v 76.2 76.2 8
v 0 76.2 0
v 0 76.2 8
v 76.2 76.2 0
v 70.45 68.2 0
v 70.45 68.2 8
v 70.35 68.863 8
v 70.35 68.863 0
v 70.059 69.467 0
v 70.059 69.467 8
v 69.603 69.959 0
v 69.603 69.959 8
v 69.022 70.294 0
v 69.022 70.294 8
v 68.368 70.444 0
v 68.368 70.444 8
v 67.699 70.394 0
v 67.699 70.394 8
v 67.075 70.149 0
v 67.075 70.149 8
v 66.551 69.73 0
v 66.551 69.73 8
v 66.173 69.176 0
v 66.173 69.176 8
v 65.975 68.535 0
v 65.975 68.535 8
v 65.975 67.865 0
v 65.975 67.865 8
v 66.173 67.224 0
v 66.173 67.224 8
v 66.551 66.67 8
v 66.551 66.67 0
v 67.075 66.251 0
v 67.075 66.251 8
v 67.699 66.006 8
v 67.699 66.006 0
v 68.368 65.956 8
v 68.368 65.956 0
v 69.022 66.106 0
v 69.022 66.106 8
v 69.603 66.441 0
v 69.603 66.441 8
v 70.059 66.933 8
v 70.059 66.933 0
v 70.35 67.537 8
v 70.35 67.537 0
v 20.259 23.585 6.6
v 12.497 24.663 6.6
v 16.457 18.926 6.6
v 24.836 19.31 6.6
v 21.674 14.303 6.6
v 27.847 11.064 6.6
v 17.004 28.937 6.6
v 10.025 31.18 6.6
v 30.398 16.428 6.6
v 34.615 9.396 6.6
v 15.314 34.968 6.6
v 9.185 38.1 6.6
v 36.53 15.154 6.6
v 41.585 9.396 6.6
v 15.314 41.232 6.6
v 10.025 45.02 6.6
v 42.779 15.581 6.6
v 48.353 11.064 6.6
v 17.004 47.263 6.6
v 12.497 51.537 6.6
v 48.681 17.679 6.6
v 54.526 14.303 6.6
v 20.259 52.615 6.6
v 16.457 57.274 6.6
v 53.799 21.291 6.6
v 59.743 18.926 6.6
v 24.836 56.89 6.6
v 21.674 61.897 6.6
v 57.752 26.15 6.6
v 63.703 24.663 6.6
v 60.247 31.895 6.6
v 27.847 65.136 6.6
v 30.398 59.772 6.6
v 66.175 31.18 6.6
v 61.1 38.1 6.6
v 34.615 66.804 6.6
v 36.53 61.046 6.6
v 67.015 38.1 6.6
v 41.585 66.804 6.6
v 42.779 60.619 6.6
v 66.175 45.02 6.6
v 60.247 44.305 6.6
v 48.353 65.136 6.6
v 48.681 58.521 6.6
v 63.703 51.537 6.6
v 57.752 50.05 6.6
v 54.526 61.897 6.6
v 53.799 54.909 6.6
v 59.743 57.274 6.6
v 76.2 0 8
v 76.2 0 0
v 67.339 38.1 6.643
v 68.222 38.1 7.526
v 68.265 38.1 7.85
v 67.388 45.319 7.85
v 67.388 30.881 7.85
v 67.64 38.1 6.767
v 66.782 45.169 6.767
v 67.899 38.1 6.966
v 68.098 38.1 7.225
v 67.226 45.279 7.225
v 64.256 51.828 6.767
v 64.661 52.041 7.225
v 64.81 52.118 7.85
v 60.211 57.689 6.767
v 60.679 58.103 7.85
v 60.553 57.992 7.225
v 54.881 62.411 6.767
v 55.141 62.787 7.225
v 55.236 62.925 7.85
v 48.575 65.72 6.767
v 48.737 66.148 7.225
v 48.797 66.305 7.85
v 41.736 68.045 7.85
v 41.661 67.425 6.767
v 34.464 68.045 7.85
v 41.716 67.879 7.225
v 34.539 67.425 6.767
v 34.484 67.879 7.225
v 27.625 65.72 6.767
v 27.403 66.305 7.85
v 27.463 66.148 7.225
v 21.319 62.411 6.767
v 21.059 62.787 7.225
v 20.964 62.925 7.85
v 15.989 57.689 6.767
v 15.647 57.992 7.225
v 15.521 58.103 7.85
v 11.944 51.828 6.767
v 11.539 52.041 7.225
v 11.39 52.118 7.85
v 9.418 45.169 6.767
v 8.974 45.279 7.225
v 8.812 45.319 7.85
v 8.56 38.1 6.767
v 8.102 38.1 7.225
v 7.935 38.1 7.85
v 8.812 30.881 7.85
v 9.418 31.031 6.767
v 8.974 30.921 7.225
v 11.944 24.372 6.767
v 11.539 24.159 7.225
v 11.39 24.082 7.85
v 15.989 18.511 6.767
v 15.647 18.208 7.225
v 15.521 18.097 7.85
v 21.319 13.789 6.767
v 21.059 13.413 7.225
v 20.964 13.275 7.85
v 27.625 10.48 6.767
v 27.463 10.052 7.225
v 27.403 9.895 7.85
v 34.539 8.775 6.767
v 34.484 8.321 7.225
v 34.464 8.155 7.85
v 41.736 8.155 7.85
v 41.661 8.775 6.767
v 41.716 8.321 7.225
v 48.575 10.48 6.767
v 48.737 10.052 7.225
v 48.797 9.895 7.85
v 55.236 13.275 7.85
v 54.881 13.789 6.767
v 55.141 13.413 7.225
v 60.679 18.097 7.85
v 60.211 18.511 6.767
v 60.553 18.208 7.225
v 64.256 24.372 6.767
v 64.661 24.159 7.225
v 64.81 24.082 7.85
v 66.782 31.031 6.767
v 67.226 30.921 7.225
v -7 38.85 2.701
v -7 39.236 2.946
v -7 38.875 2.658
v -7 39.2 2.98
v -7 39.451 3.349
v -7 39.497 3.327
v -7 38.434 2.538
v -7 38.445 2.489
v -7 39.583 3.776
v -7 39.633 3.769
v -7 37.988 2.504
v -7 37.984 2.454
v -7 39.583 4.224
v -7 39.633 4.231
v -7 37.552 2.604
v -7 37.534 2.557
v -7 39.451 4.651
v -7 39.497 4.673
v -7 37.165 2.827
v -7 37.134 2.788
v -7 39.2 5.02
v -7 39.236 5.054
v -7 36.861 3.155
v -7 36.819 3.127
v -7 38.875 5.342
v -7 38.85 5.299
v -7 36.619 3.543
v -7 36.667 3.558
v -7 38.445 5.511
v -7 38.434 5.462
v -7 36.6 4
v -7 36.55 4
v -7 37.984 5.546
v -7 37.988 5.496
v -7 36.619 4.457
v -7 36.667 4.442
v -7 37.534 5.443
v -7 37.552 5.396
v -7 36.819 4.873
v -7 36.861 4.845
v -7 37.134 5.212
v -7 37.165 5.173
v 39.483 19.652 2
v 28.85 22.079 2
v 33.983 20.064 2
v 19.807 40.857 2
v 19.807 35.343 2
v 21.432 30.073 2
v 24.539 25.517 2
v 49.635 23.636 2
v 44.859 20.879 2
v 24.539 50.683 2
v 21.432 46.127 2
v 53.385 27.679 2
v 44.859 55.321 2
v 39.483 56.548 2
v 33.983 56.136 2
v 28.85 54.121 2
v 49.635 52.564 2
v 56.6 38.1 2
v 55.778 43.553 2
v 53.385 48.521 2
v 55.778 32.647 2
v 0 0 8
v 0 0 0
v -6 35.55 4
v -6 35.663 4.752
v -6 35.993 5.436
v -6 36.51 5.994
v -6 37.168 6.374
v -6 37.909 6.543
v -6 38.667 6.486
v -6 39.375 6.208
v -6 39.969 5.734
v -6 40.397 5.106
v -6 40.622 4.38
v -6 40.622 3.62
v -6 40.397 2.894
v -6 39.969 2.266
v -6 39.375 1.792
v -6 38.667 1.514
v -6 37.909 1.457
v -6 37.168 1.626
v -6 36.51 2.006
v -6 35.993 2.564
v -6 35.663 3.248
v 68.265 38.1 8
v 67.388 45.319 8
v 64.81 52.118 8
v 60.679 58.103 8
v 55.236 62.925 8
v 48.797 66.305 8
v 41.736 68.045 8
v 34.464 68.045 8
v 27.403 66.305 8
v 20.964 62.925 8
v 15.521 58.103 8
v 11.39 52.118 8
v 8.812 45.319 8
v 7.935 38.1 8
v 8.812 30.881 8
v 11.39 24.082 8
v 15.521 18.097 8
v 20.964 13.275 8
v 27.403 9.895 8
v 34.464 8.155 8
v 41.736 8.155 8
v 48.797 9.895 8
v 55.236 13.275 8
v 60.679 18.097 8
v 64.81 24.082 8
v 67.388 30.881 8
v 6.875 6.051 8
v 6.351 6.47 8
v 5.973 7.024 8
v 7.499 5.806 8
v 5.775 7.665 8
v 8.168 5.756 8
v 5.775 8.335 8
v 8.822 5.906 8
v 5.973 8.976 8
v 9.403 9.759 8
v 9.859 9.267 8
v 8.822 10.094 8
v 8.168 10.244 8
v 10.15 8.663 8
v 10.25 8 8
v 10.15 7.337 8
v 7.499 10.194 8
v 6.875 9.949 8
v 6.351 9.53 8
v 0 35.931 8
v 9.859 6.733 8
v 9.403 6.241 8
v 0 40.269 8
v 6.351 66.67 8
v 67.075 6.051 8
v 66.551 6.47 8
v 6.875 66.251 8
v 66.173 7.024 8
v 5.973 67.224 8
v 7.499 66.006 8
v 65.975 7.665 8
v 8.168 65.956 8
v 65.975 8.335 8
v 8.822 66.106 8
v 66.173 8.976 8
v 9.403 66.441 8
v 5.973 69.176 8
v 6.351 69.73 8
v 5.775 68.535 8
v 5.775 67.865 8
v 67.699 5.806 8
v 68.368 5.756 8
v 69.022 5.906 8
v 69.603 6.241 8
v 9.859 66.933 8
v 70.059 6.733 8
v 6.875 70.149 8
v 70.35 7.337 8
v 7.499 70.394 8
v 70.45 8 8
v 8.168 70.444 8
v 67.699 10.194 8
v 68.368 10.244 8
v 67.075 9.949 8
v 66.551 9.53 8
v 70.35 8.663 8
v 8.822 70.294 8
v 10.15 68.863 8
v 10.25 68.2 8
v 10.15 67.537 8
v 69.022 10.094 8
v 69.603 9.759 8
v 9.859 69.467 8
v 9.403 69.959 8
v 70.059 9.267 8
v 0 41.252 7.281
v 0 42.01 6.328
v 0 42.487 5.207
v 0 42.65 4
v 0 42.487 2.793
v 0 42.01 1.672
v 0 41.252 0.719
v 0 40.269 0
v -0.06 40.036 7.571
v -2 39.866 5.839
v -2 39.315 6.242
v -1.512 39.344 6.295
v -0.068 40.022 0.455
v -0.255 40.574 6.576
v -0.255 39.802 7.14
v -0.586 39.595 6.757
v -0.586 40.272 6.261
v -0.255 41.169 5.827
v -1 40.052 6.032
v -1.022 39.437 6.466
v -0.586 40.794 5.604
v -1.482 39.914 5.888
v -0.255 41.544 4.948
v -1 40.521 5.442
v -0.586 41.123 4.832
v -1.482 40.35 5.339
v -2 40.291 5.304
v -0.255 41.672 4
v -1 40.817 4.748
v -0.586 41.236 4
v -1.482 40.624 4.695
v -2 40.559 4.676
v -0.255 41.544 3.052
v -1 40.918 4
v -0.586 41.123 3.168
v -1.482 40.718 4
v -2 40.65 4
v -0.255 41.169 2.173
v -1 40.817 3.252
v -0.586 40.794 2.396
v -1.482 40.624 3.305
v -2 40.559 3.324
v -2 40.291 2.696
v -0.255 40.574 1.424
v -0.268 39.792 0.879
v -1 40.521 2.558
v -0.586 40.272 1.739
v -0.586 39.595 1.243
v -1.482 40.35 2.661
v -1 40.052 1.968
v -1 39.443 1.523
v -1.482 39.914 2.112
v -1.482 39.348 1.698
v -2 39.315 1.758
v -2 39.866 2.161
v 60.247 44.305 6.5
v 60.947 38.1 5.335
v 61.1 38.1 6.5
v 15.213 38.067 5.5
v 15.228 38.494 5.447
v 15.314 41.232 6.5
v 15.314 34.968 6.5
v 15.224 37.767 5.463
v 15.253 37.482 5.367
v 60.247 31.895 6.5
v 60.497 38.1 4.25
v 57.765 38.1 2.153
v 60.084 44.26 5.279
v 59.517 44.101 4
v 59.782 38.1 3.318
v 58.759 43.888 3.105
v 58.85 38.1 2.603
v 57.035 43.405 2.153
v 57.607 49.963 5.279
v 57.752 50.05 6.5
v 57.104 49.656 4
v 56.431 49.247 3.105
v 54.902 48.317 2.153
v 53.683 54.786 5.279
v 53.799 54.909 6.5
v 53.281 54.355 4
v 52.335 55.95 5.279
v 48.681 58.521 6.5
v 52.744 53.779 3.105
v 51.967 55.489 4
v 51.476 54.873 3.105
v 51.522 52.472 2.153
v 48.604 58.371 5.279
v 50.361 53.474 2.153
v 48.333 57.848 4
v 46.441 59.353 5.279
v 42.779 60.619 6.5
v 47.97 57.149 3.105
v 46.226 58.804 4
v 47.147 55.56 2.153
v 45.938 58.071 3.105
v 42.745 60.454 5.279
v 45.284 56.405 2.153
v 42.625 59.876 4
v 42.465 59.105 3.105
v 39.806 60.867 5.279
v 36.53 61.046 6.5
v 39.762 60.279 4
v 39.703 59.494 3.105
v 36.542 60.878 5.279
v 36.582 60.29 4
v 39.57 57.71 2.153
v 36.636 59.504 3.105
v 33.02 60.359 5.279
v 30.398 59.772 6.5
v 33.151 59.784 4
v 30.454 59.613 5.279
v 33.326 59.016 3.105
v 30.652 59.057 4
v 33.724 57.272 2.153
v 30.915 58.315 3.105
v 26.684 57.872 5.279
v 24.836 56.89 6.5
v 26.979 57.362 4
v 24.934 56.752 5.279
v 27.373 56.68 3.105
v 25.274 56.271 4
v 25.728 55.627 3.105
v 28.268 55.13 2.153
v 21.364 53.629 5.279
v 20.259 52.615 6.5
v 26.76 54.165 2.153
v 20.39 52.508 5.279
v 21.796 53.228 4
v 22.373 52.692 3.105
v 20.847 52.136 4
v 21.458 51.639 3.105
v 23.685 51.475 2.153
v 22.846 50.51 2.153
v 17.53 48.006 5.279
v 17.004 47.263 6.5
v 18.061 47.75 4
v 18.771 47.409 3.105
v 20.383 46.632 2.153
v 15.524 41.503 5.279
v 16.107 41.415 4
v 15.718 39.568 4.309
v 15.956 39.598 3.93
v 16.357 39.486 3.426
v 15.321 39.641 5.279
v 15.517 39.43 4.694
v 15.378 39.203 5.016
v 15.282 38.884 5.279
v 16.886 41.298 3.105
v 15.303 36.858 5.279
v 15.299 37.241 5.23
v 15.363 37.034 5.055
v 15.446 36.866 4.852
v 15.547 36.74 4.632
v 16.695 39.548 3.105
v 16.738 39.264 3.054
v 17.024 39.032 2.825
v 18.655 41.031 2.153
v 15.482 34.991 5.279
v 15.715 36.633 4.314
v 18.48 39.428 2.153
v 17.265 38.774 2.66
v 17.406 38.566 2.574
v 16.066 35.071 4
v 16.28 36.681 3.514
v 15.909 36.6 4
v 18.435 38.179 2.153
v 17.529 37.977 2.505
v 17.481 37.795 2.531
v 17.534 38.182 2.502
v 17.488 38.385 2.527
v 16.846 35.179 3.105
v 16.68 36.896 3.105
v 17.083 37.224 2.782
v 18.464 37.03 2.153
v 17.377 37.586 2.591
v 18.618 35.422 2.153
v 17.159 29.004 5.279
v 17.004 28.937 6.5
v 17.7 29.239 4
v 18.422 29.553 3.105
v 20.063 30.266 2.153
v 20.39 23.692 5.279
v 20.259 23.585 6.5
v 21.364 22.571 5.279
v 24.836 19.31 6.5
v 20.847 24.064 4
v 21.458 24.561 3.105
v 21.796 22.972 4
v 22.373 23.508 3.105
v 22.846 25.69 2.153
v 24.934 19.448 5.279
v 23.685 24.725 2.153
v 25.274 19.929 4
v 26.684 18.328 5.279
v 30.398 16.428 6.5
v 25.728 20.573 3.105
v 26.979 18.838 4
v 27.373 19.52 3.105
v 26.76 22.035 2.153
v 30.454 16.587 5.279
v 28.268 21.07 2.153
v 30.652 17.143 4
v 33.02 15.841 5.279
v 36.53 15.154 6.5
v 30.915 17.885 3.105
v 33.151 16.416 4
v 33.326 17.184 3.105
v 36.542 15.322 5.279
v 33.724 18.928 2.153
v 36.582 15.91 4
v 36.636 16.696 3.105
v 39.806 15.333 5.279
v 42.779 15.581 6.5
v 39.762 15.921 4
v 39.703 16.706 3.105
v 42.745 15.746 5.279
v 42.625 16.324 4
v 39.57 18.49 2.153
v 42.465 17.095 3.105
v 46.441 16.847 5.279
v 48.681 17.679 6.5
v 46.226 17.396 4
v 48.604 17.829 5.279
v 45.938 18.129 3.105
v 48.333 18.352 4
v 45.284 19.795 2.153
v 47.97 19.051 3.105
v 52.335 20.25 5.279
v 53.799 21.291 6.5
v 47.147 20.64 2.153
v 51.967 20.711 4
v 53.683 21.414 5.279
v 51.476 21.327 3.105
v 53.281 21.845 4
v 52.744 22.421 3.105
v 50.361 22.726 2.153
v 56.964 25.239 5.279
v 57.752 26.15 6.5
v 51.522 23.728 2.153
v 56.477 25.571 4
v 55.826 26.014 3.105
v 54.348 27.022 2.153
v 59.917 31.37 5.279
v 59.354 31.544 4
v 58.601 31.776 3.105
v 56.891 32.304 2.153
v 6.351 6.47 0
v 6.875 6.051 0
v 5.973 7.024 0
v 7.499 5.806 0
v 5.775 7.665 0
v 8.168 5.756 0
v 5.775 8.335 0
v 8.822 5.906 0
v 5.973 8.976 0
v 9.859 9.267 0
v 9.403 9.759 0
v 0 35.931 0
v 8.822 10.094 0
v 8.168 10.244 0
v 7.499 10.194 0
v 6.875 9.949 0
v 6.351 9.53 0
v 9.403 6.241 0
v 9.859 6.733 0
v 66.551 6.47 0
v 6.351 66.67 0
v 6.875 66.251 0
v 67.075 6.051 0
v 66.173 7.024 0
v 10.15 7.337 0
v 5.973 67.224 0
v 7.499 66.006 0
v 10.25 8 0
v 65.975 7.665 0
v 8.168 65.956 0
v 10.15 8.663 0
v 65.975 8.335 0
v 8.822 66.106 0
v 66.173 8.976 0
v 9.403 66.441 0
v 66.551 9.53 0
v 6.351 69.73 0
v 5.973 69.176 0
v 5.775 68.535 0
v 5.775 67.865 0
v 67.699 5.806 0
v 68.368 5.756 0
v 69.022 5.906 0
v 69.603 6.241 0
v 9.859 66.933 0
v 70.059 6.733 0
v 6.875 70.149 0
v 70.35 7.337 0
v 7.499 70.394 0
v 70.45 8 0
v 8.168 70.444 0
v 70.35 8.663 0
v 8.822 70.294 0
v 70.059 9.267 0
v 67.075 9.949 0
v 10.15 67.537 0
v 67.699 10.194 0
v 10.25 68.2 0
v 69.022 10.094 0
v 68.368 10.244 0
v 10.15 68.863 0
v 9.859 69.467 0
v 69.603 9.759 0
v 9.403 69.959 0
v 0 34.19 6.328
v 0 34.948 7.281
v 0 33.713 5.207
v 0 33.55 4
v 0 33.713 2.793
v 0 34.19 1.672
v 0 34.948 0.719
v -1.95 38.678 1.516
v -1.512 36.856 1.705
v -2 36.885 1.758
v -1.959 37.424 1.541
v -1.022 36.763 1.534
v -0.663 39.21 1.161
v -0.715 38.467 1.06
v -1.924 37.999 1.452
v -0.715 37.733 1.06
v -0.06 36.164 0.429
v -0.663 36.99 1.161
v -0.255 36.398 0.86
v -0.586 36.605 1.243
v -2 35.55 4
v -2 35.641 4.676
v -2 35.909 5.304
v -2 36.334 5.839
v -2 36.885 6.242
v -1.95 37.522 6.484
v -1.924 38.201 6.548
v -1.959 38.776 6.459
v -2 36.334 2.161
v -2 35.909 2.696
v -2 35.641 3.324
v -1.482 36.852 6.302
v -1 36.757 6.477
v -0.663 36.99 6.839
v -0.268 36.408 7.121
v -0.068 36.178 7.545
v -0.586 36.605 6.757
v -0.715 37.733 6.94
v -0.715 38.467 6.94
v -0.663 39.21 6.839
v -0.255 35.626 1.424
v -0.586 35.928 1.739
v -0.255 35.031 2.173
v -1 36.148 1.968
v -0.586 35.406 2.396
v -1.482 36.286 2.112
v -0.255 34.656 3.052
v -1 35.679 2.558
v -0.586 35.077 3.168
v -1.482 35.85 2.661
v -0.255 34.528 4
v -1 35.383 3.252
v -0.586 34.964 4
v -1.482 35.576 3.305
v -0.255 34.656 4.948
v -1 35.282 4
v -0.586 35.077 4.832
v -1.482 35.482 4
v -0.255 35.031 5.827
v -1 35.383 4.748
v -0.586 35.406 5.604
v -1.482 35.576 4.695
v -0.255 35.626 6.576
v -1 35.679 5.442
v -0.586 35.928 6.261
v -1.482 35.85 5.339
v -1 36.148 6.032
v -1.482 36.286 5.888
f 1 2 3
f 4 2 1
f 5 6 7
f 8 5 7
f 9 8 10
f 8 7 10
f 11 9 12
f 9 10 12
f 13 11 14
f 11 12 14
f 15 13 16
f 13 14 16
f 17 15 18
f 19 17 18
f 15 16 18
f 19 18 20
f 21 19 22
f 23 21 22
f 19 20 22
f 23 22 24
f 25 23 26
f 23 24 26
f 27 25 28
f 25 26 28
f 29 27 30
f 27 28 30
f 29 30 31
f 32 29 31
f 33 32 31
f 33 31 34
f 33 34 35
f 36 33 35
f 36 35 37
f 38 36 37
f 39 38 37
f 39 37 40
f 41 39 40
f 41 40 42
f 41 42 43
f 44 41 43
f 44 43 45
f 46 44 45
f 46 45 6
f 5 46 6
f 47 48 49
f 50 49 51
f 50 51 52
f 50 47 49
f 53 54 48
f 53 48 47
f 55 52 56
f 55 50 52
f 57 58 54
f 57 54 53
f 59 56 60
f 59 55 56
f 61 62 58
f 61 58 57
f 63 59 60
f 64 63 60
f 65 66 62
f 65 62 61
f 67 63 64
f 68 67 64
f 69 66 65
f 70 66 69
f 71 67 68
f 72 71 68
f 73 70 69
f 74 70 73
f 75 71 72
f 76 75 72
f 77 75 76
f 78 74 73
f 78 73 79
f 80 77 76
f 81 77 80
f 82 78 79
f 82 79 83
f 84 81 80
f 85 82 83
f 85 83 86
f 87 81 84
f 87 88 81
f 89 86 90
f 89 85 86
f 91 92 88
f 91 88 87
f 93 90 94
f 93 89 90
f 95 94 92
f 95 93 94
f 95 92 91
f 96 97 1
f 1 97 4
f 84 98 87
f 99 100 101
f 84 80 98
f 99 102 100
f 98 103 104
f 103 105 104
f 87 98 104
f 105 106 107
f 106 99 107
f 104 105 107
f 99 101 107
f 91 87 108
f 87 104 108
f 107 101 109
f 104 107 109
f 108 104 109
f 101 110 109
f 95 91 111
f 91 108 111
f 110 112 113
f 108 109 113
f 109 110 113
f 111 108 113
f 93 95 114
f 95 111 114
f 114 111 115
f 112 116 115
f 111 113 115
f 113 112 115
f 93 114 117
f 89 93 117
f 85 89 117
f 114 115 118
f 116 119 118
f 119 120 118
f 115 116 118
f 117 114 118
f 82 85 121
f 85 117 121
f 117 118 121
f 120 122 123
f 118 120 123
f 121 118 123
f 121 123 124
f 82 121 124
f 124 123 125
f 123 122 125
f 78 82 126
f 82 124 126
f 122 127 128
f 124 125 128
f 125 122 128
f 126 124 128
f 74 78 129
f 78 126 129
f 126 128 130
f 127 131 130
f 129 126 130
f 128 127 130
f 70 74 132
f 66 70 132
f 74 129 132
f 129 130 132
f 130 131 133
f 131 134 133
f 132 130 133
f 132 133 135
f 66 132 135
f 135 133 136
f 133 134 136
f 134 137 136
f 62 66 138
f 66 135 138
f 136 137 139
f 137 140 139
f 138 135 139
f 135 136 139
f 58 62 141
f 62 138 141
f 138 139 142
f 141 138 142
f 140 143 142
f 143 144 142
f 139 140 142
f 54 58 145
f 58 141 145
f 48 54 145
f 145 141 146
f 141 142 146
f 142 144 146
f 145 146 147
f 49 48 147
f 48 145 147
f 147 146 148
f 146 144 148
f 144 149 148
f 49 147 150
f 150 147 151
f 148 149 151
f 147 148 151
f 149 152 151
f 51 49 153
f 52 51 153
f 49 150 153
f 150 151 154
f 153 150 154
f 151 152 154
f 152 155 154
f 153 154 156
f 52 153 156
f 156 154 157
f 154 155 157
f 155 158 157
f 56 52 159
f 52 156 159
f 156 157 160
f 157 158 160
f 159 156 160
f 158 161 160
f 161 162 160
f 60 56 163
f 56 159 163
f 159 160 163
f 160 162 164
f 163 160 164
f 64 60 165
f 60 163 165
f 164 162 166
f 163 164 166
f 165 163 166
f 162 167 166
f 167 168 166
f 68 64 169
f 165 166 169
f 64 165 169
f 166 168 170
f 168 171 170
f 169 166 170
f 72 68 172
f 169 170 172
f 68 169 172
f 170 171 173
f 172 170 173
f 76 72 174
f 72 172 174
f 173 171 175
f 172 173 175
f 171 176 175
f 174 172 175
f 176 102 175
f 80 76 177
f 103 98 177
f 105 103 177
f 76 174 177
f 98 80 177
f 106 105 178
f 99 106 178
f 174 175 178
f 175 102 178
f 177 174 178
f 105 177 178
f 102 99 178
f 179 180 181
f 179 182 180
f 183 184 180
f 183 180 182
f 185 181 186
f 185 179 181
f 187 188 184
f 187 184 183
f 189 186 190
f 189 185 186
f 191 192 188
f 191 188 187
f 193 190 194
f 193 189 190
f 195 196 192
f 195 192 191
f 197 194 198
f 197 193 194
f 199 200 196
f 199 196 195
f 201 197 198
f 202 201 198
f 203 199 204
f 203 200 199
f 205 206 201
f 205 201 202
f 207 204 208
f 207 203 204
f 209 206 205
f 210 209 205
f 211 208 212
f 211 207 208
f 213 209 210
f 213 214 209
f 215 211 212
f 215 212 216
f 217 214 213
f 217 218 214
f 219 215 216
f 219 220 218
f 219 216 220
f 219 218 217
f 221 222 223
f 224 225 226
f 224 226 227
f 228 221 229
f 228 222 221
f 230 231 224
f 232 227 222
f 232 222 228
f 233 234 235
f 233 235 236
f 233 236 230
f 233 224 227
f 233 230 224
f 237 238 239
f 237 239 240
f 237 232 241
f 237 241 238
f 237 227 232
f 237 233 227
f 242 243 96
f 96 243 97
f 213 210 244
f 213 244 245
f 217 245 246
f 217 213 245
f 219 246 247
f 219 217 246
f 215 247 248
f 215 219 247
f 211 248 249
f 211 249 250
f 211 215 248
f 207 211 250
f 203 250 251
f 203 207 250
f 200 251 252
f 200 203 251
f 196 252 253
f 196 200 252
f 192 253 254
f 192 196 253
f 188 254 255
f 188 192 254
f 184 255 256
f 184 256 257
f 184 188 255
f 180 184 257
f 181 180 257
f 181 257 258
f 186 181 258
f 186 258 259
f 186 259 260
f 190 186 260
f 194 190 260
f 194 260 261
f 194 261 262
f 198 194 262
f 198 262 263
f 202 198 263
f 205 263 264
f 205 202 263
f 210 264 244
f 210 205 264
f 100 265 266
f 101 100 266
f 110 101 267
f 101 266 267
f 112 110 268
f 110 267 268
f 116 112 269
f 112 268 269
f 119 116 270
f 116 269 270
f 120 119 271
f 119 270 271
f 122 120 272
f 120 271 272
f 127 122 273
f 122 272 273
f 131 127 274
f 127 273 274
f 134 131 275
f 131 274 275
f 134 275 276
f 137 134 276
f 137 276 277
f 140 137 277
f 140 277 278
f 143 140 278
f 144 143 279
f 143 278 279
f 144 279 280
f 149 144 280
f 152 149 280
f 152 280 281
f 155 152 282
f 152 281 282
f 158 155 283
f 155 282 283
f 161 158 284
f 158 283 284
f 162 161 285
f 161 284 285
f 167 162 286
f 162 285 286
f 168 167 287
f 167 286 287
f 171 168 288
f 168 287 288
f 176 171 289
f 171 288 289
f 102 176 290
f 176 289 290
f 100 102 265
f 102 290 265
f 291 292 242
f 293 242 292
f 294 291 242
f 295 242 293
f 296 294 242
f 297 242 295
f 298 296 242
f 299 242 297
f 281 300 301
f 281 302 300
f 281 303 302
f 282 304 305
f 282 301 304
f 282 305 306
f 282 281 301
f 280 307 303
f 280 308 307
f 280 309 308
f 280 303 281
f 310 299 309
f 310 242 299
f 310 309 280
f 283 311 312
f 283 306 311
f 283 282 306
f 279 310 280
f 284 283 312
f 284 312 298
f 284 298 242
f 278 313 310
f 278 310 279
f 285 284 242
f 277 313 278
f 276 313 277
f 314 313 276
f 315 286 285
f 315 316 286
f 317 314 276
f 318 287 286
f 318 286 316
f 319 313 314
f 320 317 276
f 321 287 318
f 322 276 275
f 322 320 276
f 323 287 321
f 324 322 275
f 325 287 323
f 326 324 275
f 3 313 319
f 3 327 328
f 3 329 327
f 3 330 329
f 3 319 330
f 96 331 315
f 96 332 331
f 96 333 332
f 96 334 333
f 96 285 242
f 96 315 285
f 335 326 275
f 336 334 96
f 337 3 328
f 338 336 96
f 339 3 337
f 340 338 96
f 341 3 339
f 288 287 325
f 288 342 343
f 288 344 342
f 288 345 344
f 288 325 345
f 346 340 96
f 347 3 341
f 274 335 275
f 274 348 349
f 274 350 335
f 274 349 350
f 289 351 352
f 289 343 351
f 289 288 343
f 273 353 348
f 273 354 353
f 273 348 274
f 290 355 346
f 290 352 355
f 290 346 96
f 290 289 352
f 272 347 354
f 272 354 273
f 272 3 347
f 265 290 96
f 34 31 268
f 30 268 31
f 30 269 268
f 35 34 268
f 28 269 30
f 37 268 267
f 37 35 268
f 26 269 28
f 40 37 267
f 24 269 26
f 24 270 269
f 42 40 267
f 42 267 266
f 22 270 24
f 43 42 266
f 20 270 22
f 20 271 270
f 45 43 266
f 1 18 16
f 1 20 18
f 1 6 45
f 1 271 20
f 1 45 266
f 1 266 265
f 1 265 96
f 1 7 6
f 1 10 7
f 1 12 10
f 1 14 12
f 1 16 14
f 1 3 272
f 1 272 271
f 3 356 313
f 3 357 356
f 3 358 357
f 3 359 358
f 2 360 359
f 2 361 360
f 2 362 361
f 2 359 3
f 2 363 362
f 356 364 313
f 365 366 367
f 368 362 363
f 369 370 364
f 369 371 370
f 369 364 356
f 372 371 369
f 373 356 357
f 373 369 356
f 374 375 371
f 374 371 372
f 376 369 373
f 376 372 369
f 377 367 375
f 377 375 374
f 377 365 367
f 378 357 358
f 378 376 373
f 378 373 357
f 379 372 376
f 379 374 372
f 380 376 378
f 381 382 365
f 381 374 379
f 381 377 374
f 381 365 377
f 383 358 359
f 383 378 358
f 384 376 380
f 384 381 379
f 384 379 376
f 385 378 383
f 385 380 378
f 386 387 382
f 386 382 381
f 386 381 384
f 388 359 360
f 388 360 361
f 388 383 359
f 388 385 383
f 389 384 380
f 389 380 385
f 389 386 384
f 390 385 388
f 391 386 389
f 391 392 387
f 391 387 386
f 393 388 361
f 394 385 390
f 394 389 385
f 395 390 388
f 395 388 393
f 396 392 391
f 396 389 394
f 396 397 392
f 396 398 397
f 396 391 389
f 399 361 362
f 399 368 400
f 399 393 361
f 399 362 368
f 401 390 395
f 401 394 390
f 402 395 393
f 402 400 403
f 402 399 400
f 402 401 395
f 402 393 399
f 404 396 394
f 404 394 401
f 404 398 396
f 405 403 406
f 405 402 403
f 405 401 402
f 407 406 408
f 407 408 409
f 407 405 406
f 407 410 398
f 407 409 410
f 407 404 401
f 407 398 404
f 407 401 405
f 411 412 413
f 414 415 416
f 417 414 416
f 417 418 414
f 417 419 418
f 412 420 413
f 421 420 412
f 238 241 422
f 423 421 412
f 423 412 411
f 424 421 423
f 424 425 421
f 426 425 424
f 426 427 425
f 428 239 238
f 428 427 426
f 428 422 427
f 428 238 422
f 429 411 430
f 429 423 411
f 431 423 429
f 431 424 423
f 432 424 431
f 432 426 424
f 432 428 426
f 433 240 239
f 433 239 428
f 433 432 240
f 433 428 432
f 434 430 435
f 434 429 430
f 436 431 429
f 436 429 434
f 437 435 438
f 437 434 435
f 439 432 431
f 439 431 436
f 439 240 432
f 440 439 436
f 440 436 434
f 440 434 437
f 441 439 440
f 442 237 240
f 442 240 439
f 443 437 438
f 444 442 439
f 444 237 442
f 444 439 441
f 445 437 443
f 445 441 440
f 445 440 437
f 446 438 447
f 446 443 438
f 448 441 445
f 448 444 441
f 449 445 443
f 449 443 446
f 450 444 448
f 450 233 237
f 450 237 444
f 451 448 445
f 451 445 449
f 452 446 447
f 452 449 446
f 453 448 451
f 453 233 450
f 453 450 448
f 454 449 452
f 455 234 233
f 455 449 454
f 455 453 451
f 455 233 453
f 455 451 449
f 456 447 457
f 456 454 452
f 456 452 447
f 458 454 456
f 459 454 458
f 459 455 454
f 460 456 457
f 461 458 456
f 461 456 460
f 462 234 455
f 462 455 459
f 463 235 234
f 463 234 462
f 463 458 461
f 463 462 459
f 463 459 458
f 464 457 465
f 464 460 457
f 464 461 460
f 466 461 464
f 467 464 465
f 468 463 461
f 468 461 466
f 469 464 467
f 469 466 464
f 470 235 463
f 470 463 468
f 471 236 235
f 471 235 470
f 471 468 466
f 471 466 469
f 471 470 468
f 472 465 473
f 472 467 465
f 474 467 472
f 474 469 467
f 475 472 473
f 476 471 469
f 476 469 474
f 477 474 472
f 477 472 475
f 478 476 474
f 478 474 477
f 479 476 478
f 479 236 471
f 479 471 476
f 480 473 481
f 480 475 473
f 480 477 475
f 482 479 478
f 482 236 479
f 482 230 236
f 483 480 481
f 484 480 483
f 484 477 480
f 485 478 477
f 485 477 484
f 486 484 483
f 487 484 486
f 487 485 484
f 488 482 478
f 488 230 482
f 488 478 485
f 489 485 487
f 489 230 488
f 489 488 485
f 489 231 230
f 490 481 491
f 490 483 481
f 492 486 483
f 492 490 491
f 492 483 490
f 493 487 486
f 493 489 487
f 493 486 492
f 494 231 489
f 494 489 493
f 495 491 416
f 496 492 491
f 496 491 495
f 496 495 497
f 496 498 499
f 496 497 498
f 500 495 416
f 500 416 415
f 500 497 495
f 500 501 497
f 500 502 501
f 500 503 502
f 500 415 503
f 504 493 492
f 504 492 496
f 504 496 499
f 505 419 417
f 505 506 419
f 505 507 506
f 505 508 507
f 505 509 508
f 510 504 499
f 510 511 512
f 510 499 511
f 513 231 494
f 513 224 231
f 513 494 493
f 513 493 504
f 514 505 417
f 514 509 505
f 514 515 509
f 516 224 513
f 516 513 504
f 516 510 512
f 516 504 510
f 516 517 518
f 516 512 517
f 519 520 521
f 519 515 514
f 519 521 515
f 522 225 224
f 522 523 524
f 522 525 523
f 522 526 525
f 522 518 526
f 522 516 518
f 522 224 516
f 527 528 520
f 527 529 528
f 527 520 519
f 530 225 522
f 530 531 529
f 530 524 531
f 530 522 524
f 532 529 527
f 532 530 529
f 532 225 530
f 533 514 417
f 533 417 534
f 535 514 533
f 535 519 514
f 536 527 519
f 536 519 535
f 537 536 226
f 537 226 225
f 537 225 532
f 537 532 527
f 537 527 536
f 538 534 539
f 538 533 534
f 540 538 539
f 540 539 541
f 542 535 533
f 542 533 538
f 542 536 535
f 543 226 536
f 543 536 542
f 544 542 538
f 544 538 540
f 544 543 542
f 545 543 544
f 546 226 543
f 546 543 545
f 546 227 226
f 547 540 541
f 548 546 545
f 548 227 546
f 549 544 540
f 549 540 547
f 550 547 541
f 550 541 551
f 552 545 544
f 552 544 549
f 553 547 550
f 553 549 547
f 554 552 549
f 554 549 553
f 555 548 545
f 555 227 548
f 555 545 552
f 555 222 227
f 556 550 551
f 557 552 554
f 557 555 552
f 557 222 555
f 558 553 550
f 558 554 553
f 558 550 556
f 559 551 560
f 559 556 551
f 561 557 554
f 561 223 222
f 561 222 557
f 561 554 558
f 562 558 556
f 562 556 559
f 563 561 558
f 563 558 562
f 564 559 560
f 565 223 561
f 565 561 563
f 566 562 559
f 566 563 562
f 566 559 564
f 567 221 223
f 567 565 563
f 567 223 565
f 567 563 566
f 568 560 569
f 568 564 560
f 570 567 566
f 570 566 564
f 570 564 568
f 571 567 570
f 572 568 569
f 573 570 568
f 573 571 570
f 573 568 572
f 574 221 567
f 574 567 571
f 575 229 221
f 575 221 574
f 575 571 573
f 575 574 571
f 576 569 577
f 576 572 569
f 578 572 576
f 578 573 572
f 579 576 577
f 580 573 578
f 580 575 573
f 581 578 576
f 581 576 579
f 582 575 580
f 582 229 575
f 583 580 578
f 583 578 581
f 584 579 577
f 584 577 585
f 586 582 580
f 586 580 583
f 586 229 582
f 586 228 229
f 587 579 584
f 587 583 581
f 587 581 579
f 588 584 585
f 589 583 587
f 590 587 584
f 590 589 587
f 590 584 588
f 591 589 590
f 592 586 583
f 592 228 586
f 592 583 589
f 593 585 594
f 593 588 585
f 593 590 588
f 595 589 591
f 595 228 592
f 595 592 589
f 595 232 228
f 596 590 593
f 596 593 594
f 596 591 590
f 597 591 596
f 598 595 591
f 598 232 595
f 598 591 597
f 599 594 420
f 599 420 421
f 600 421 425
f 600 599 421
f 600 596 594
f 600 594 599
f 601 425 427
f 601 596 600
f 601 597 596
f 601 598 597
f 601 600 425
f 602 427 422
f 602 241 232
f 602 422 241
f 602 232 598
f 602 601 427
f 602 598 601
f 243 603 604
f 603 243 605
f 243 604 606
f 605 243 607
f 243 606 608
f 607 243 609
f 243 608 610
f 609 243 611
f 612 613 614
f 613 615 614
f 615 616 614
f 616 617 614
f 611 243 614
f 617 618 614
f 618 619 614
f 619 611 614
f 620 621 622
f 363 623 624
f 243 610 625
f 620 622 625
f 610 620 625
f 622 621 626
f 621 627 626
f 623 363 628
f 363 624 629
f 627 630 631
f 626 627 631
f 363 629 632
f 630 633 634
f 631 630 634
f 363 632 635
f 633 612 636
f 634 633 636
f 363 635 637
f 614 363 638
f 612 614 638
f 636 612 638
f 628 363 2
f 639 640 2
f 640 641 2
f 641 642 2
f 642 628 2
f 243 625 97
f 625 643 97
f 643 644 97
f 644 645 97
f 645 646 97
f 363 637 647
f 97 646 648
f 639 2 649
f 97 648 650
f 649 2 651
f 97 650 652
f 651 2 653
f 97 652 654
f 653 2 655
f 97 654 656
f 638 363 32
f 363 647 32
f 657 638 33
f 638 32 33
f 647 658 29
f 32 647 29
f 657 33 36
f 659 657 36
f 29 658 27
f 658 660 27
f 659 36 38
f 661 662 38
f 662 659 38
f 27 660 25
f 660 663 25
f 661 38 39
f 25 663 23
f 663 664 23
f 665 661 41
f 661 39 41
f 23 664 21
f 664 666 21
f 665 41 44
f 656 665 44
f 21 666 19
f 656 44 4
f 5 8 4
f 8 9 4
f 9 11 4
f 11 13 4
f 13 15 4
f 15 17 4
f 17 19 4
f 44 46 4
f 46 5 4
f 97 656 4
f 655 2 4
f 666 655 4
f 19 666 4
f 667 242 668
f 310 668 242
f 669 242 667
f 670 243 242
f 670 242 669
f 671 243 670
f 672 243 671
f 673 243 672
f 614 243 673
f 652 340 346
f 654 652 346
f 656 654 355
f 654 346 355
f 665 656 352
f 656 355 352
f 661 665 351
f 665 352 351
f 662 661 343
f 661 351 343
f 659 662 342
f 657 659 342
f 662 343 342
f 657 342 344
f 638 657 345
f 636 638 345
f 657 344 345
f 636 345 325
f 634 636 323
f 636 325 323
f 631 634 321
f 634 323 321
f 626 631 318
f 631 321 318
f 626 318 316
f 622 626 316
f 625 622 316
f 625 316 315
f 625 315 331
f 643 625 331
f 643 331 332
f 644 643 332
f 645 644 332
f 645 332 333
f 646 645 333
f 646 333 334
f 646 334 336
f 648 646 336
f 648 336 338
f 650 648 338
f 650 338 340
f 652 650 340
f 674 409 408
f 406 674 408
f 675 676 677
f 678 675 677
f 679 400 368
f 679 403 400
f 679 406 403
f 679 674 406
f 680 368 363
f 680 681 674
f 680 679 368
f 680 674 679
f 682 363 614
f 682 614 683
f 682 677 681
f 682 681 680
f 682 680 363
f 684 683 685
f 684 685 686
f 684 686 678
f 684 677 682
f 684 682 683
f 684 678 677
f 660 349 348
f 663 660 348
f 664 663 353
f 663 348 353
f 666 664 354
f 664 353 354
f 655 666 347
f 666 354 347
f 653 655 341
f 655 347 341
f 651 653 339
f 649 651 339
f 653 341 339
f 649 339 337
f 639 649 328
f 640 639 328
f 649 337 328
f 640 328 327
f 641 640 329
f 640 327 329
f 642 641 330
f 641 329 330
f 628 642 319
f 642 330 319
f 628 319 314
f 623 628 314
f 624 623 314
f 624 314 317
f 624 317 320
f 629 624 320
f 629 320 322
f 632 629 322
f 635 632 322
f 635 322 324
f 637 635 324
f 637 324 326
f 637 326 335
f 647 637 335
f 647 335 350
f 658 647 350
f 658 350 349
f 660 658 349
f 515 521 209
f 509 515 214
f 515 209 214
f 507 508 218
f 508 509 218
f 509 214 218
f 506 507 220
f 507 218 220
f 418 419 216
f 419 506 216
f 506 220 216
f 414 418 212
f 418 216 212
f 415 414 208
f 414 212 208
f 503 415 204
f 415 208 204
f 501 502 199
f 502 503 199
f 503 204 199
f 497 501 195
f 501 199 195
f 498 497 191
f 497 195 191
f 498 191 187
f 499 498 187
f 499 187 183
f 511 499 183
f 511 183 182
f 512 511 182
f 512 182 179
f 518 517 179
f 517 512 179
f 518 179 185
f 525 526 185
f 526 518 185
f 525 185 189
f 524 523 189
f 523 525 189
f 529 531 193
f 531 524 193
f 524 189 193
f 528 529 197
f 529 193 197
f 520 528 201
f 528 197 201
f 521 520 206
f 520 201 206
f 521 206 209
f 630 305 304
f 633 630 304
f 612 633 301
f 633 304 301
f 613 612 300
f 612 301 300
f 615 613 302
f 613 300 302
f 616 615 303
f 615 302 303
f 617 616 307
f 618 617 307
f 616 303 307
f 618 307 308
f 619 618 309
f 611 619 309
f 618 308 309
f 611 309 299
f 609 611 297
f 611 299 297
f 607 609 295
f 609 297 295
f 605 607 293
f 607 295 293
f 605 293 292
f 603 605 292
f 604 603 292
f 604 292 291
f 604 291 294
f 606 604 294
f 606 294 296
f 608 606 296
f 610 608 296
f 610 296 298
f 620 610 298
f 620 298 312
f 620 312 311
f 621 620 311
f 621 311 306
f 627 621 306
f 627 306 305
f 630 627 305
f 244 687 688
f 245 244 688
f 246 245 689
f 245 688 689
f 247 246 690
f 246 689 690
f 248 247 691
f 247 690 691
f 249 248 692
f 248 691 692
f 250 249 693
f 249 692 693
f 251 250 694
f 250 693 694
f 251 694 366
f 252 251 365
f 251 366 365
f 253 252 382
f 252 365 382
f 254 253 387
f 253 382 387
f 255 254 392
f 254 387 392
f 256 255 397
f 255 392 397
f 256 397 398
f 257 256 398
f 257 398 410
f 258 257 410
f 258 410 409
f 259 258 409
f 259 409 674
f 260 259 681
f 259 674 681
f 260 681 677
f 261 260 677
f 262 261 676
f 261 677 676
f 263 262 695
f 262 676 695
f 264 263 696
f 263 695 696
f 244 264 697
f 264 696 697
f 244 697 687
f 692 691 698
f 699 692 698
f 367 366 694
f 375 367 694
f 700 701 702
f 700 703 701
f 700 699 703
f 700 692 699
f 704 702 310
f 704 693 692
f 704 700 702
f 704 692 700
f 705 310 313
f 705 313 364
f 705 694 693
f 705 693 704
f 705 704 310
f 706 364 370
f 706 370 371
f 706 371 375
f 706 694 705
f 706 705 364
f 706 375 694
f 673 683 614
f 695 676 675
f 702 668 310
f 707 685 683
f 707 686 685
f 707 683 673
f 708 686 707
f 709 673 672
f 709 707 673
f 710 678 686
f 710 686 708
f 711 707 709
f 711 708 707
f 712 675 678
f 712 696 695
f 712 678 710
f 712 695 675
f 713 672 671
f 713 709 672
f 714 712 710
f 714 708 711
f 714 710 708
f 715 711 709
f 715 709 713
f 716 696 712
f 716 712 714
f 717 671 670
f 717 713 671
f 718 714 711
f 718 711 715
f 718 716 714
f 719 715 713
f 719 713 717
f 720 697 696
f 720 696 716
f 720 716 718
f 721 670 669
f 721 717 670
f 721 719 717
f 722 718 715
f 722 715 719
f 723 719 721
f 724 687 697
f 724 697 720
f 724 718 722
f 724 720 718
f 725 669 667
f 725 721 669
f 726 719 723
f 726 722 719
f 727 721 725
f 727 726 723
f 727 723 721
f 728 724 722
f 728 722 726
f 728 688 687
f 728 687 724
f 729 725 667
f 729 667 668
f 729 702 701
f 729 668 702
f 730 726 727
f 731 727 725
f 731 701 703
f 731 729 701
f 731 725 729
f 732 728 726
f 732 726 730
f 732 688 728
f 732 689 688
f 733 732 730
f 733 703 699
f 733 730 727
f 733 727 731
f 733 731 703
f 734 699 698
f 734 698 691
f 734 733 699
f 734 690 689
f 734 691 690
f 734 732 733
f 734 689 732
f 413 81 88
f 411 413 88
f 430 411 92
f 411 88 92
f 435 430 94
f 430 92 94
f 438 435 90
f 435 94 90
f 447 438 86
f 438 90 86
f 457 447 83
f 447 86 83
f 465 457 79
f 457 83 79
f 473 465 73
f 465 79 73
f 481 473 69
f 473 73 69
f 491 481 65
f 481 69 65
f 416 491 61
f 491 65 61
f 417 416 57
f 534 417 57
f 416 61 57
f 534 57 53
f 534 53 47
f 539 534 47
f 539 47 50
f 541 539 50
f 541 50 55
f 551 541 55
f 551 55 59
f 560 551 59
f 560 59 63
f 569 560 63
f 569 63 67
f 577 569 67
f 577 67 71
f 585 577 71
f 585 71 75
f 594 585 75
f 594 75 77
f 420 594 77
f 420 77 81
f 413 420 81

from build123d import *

# Parameters (mm, degrees)
SKETCH_W        = 76.2
SKETCH_H        = 76.2
PAD_DEPTH       = 8
SKETCH002_R     = 2.25
POCKET001_DEPTH = 10.001
SKETCH003_R     = 23
POCKET002_DEPTH = 6
SKETCH004_R     = 2.55
PAD001_DEPTH    = 7
SKETCH006_R     = 30.165
POCKET_DEPTH    = 1.4
CHAMFER_SIZE    = 1
FILLET_R        = 4.5
FILLET001_R     = 1.25
FILLET002_R     = 2
SKETCH005_R     = 1.5
POCKET003_DEPTH = 30


with BuildPart() as part:
    # Sketch → Pad (new body)
    with BuildSketch(Plane.XY):
        with Locations((38.1, 38.1)):
            Rectangle(SKETCH_W, SKETCH_H)
    extrude(amount=PAD_DEPTH)

    # Sketch002 → Pocket001 (cut, through all)
    with BuildSketch(Plane.XY.offset(10)):
        with Locations((8, 8)):
            Circle(SKETCH002_R)
        with Locations((8, 68.2)):
            Circle(SKETCH002_R)
        with Locations((68.2, 68.2)):
            Circle(SKETCH002_R)
        with Locations((68.2, 8)):
            Circle(SKETCH002_R)
    extrude(amount=-POCKET001_DEPTH, mode=Mode.SUBTRACT)

    # Sketch003 (on Face5 of Pocket001) → Pocket002 (cut)
    with BuildSketch(Plane.XY.offset(8)):
        with Locations((38.1, 38.1)):
            Circle(SKETCH003_R)
    extrude(amount=-POCKET002_DEPTH, mode=Mode.SUBTRACT)

    # Sketch004 (on Face2 of Pocket002) → Pad001 (join)
    with BuildSketch(Plane(origin=(0, 0, 0), x_dir=(0, -1, 0), z_dir=(-1, 0, 0))):
        with Locations((-38.1, 4)):
            Circle(SKETCH004_R)
    extrude(amount=PAD001_DEPTH)

    # Sketch006 (on Face5 of Pad001) → Pocket (cut)
    with BuildSketch(Plane.XY.offset(8)):
        with Locations((38.1, 38.1)):
            Circle(SKETCH006_R)
    extrude(amount=-POCKET_DEPTH, mode=Mode.SUBTRACT)

    # Chamfer
    chamfer_edges = [part.edges().sort_by_distance(p)[0] for p in [
        (-7, 40.65, 4),
    ]]
    chamfer(chamfer_edges, length=CHAMFER_SIZE)

    # Fillet
    fillet_edges = [part.edges().sort_by_distance(p)[0] for p in [
        (15.1, 38.1, 2),
    ]]
    fillet(fillet_edges, radius=FILLET_R)

    # Fillet001
    fillet001_edges = [part.edges().sort_by_distance(p)[0] for p in [
        (7.935, 38.1, 6.6),
    ]]
    fillet(fillet001_edges, radius=FILLET001_R)

    # Fillet002
    fillet002_edges = [part.edges().sort_by_distance(p)[0] for p in [
        (0, 40.65, 4),
    ]]
    fillet(fillet002_edges, radius=FILLET002_R)

    # Sketch005 (on Face13 of Pad001) → Pocket003 (cut)
    with BuildSketch(Plane(origin=(-7, 0, 0), x_dir=(0, -1, 0), z_dir=(-1, 0, 0))):
        with Locations((-38.1, 4)):
            Circle(SKETCH005_R)
    extrude(amount=-POCKET003_DEPTH, mode=Mode.SUBTRACT)


solid = part.part
